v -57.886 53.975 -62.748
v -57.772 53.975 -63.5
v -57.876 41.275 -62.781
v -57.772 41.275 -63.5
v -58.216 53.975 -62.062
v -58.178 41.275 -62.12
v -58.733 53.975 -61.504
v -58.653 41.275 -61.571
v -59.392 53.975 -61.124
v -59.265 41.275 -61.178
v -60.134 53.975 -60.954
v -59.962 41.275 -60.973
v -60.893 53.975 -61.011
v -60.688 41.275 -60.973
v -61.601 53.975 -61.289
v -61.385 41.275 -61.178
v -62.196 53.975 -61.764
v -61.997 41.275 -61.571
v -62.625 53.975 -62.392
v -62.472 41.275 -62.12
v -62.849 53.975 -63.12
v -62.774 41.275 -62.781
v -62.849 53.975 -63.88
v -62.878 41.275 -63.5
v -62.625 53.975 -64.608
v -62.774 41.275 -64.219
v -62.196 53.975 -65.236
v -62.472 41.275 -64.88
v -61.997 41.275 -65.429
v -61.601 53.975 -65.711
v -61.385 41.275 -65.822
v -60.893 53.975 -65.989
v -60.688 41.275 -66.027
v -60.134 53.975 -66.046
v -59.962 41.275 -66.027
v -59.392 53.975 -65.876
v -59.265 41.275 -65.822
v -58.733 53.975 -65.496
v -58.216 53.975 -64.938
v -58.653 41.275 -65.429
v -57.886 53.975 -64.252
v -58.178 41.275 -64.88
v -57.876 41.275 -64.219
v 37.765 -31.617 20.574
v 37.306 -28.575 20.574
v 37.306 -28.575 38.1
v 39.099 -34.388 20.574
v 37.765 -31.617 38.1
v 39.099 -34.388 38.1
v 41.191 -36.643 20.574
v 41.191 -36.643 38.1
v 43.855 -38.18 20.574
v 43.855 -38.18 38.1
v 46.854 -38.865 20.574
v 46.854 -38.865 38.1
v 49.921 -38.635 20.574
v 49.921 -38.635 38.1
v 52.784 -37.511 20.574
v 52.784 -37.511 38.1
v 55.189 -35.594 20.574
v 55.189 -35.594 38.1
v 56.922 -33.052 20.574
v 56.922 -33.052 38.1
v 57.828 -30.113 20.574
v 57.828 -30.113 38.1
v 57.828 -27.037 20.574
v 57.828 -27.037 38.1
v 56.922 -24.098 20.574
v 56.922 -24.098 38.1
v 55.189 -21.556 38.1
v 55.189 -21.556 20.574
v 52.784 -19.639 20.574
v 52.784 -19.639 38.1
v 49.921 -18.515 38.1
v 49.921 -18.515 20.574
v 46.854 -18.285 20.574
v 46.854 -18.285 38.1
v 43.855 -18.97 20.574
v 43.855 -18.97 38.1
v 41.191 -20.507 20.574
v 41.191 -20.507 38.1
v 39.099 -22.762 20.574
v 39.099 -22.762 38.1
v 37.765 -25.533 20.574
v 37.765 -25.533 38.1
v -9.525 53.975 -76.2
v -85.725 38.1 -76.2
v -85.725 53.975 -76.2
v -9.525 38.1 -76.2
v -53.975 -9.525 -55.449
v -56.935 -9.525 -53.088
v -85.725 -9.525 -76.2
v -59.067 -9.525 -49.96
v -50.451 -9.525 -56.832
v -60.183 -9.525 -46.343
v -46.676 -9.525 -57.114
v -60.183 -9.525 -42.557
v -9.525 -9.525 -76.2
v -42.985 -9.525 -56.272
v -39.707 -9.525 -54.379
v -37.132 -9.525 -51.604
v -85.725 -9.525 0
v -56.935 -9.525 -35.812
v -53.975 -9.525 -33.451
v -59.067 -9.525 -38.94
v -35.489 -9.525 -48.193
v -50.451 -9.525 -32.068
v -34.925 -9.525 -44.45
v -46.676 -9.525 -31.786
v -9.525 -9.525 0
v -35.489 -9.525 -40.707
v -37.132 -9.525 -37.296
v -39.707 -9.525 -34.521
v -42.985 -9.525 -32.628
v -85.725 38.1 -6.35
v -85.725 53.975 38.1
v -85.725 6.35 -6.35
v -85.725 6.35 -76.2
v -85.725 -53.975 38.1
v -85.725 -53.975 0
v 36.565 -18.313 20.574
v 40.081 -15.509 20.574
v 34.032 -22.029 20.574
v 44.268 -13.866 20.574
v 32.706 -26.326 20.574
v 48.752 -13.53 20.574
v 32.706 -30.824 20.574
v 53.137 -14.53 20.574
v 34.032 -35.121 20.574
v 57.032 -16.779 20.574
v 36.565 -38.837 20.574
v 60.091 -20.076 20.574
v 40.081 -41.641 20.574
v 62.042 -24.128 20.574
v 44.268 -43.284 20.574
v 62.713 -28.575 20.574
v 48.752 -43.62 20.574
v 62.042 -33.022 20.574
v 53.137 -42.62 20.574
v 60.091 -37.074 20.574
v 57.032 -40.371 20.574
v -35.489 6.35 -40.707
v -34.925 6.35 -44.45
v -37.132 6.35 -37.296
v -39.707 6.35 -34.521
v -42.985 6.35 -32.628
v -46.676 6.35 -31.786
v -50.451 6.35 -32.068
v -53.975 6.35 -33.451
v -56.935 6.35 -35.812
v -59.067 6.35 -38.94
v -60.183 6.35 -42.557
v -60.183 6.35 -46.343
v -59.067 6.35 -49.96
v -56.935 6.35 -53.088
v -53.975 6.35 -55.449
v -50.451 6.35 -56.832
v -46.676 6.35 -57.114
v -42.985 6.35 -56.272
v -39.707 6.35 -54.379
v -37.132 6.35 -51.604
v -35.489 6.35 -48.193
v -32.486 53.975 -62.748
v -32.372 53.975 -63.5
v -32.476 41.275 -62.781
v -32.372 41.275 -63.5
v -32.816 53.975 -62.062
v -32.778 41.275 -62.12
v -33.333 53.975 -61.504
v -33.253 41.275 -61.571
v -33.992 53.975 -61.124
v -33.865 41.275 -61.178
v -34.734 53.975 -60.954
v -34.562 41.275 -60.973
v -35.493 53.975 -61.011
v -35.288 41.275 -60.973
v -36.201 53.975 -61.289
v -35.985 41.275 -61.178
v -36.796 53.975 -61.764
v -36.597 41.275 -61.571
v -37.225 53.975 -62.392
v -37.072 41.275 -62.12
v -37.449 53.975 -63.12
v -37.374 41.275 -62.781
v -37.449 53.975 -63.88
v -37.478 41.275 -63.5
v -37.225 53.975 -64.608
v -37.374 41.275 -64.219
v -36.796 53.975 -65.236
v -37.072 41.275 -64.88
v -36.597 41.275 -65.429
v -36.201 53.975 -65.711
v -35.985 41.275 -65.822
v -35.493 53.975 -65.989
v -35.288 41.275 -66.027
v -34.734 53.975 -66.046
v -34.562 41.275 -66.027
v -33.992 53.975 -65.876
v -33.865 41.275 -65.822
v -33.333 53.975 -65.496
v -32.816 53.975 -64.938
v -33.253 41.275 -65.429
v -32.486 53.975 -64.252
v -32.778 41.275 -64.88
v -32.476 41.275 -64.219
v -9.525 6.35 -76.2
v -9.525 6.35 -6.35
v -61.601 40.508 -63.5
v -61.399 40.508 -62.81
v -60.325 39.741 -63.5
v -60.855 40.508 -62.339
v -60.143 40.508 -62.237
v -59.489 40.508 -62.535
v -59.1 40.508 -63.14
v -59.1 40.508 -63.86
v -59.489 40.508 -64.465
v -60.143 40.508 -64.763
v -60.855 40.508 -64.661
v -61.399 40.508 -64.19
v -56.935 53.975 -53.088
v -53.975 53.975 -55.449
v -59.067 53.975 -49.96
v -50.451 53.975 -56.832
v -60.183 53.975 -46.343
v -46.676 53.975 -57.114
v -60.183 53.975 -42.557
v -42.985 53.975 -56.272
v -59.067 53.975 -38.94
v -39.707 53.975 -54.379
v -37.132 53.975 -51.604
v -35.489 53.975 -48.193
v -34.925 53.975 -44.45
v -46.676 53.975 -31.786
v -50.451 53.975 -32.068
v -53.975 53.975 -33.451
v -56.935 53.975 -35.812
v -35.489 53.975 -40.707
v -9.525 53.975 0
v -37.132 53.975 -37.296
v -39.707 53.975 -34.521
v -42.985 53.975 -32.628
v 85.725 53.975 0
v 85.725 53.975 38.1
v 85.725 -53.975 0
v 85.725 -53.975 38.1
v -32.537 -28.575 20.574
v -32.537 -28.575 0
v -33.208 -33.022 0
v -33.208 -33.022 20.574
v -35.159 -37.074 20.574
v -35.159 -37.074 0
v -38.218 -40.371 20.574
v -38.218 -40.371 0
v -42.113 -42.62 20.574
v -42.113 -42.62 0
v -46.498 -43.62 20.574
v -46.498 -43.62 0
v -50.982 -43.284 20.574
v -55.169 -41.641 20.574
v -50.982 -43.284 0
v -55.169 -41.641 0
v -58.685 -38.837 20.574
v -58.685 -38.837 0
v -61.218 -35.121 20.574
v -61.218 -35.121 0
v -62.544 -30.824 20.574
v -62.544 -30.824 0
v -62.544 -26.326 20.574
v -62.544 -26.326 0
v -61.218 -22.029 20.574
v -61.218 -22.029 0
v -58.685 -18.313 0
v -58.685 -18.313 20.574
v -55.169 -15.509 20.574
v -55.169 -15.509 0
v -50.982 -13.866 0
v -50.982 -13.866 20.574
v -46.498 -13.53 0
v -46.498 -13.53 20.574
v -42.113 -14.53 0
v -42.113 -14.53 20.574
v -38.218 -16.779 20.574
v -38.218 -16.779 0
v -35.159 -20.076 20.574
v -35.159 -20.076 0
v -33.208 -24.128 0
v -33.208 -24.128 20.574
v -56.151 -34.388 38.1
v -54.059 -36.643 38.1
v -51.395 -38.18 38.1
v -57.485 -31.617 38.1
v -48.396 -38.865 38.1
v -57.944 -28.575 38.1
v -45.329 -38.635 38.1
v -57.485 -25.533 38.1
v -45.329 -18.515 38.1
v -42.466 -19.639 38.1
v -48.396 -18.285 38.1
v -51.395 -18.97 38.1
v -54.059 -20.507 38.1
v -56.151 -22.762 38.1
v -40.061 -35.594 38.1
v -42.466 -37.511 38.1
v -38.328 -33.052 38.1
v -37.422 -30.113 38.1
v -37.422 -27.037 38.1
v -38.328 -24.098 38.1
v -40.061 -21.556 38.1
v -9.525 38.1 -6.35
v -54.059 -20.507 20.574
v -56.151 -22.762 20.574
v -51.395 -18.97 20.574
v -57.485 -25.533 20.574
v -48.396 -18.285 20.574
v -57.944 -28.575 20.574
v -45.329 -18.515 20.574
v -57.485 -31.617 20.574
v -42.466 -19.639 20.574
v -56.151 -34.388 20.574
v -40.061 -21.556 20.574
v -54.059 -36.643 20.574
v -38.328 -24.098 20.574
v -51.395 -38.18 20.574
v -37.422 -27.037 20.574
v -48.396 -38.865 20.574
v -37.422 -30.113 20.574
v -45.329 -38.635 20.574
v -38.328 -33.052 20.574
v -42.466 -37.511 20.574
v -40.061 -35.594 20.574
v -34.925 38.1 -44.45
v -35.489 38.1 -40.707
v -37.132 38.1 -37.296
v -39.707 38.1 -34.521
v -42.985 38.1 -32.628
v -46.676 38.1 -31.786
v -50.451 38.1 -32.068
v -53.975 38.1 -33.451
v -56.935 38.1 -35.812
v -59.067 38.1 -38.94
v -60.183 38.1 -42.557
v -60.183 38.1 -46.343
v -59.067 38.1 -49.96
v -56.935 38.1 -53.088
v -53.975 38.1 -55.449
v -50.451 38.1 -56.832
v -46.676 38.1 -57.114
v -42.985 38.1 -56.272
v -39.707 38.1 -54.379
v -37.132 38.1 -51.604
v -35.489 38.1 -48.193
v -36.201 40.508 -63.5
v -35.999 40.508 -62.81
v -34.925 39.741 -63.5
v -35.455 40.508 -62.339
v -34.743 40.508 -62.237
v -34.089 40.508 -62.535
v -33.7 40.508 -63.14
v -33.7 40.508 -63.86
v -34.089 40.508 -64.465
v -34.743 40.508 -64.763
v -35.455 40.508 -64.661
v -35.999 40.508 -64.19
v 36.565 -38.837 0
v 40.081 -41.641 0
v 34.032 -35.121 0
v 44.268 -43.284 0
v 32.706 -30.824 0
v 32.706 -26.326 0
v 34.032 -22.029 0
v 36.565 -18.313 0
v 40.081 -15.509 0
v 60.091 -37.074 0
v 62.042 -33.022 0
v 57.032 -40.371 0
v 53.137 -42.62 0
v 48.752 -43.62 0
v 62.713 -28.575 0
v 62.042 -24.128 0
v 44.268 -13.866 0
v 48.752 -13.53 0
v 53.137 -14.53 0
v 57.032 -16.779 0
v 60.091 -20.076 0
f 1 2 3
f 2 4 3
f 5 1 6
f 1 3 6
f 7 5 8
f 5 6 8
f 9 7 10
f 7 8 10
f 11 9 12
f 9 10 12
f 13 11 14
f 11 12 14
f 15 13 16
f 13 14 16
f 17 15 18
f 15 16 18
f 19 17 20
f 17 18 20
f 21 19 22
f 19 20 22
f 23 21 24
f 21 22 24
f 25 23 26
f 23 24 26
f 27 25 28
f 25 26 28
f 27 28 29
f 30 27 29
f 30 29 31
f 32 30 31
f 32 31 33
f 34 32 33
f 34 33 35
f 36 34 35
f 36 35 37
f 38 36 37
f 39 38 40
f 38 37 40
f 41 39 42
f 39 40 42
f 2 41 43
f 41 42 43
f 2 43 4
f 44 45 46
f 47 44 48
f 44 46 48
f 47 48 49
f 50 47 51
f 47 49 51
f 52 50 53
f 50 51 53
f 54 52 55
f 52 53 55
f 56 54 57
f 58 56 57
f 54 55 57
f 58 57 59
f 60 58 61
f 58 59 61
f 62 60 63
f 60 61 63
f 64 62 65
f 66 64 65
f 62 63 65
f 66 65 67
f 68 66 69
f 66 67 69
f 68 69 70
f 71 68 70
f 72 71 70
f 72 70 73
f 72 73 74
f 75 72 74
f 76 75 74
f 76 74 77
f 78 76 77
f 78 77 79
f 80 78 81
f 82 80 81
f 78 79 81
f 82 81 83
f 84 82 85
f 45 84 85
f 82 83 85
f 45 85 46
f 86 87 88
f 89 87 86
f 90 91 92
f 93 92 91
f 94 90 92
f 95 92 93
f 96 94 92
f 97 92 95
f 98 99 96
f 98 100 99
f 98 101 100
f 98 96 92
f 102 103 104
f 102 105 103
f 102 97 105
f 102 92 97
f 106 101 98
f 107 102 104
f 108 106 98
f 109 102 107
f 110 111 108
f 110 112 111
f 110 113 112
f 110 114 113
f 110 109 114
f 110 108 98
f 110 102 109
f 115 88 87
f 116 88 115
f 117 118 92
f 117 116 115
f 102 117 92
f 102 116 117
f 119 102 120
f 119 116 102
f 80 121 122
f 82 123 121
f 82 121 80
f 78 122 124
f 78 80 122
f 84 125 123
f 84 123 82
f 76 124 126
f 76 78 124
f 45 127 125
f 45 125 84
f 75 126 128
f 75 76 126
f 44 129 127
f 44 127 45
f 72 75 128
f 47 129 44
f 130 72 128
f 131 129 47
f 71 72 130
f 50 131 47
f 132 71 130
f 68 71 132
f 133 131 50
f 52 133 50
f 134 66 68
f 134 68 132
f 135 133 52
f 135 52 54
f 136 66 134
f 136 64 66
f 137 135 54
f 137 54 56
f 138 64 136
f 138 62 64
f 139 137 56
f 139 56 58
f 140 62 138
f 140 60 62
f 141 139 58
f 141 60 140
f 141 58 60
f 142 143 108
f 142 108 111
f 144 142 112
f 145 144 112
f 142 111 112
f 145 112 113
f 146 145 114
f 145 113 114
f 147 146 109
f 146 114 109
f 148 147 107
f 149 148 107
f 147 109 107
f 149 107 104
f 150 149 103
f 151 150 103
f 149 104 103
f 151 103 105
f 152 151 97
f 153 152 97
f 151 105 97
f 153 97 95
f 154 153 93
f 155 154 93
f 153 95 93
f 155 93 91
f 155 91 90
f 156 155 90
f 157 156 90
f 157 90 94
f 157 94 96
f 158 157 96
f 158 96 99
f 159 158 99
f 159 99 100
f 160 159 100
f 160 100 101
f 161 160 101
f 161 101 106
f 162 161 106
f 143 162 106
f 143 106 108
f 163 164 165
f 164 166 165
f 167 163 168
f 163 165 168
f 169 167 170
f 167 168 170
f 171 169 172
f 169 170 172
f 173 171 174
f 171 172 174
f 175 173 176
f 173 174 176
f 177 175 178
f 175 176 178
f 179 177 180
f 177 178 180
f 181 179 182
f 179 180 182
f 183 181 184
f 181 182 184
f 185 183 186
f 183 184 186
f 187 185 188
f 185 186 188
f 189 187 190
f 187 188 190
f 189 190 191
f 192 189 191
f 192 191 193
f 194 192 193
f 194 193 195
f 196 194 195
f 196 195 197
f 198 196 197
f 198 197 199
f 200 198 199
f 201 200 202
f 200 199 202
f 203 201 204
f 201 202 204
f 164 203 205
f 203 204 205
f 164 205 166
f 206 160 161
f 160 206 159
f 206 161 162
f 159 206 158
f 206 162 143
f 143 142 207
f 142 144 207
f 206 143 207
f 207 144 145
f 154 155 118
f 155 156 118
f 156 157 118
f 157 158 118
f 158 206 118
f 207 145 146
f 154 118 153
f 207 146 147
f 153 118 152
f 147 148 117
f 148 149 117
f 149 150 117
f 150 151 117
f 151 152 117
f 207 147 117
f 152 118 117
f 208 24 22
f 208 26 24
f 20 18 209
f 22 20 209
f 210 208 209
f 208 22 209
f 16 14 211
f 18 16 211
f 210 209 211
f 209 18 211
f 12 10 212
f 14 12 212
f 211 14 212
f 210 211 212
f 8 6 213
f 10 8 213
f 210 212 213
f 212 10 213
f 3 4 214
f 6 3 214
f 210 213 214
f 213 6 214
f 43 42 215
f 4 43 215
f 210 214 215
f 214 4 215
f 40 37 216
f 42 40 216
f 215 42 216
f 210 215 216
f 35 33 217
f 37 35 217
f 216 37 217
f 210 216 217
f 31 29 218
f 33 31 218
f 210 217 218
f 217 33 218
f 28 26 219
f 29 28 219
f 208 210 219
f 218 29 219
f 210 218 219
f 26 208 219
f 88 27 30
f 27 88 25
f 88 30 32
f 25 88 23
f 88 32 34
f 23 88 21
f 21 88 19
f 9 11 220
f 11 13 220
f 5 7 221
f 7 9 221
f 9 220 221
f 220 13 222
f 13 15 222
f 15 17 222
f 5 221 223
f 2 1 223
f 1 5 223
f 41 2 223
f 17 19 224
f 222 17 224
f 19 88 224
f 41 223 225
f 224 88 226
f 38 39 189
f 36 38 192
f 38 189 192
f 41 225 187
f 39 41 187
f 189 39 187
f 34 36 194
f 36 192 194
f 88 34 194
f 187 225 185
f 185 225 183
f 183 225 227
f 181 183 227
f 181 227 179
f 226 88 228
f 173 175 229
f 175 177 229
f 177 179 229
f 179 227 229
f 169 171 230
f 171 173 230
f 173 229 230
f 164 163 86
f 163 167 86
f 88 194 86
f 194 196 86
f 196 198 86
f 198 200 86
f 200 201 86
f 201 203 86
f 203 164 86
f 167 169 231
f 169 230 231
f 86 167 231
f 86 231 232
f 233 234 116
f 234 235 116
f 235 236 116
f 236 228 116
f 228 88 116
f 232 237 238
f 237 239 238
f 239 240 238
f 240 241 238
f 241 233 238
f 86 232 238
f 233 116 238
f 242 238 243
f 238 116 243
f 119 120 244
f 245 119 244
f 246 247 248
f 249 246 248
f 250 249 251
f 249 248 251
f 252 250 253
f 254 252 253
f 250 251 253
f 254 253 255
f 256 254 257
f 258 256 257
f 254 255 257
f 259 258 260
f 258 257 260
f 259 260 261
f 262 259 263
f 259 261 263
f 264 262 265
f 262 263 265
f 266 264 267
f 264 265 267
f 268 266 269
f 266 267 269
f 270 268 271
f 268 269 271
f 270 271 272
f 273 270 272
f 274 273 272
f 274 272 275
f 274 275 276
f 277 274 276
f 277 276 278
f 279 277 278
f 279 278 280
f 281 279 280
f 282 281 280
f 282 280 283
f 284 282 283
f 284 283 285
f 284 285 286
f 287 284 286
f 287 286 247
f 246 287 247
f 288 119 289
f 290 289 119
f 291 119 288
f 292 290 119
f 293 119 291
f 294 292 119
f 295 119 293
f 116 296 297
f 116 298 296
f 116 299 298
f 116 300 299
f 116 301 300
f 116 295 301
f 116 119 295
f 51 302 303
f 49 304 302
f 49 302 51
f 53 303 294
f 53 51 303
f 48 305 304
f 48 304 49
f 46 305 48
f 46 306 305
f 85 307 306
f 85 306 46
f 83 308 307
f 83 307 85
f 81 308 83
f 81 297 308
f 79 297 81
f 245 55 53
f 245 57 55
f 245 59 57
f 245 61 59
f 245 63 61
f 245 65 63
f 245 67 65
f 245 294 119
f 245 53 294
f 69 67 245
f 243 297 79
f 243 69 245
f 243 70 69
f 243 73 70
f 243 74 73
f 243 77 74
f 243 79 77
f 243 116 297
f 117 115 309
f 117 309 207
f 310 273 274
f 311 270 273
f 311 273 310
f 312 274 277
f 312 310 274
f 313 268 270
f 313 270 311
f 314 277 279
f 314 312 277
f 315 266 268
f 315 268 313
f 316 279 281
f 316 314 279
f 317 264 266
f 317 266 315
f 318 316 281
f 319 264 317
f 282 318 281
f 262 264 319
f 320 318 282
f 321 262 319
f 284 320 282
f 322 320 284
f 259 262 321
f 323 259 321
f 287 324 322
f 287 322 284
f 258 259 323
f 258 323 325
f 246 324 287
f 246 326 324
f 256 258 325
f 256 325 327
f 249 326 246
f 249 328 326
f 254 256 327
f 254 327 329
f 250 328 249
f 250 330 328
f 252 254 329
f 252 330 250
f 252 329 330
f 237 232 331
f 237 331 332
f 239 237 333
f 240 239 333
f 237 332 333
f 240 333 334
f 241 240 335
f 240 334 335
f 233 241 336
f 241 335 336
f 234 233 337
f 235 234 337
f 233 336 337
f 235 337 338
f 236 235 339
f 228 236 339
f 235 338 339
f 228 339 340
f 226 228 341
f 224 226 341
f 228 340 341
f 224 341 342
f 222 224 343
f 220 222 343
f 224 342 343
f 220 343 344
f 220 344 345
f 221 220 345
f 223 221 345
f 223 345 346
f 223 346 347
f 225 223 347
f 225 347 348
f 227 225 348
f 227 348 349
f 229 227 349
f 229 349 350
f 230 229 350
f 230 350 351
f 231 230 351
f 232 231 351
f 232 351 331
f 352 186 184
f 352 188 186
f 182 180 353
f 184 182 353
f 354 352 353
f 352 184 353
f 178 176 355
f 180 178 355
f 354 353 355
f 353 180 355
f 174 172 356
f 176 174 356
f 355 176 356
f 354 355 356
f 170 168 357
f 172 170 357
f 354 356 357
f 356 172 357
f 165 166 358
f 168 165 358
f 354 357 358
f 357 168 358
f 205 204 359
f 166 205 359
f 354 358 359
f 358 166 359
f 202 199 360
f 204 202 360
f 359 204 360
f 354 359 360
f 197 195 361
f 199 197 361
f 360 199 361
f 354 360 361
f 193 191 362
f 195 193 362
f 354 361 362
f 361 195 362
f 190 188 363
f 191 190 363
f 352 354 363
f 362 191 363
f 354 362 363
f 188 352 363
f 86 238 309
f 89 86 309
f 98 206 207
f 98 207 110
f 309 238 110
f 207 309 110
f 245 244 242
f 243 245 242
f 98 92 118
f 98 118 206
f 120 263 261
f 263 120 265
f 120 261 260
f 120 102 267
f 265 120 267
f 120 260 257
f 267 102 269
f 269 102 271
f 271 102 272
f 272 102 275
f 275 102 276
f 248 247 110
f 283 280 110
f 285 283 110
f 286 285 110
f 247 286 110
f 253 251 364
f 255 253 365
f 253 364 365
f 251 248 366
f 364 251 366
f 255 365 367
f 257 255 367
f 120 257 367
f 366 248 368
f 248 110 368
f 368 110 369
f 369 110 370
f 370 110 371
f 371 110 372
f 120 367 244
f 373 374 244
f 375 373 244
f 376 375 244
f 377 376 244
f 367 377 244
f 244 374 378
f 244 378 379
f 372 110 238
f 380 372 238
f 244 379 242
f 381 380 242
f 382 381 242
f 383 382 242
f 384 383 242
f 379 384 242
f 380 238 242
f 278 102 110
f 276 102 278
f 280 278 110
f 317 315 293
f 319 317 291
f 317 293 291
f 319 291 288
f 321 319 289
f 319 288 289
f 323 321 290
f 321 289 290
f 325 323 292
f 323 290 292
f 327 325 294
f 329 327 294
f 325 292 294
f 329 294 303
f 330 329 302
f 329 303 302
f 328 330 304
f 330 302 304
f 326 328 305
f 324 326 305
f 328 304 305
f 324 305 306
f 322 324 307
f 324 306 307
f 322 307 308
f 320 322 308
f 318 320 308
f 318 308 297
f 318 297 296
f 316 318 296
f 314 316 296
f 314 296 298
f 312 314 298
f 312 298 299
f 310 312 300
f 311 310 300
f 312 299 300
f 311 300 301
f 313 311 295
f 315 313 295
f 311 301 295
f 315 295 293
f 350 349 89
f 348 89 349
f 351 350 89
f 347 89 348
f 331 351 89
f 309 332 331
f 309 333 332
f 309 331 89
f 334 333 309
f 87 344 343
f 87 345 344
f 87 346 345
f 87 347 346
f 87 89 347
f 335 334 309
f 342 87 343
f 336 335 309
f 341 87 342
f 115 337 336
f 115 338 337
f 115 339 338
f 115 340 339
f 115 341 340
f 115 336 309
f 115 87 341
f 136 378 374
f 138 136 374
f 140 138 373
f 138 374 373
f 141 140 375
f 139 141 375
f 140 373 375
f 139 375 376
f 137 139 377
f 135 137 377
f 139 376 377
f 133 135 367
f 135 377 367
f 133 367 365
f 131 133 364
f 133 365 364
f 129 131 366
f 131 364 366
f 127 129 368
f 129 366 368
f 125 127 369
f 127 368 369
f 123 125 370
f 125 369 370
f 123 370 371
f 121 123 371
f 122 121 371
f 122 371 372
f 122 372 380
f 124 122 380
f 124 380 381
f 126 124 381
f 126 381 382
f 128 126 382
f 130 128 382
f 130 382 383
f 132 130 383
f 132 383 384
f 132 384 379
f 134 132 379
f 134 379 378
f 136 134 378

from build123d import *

# Parameters (mm, degrees)
F0_W           = 171.45
F0_H           = 107.95
F1_DEPTH       = 38.1
F3_D           = 20.6375
F3_CBORE_D     = 30.1752
F3_CBORE_DEPTH = 20.574
F2_W           = 76.2
F2_H           = 63.5
F4_DEPTH       = 76.2
F5_W           = 31.75
F5_H           = 139.7
F6_DEPTH       = 171.451
F8_D           = 25.4
F10_D          = 5.1054
F10_DEPTH      = 12.7
F10_TIP        = 1.5338169022


with BuildPart() as f1:
    # F0 (on Top) → F1 (new body)
    with BuildSketch(Plane.XY):
        Rectangle(F0_W, F0_H)
    extrude(amount=F1_DEPTH)

    # F3 (through all)
    with Locations(Plane(origin=(0, 0, 0), x_dir=(1, 0, 0), z_dir=(0, 0, -1))):
        with Locations((-47.625, 28.575), (47.625, 28.575)):
            CounterBoreHole(F3_D / 2, F3_CBORE_D / 2, F3_CBORE_DEPTH)

    # F2 (on face) → F4 (join)
    with BuildSketch(Plane(origin=(0, 0, 0), x_dir=(1, 0, 0), z_dir=(0, 0, -1))):
        with Locations((-47.625, -22.225)):
            Rectangle(F2_W, F2_H)
    extrude(amount=F4_DEPTH)

    # F5 (on face) → F6 (cut, through all)
    with BuildSketch(Plane(origin=(-85.725, 0, 0), x_dir=(0, -1, 0), z_dir=(-1, 0, 0))):
        with Locations((-22.225, -76.2)):
            Rectangle(F5_W, F5_H)
    extrude(amount=-F6_DEPTH, mode=Mode.SUBTRACT)

    # F8 (through all)
    with Locations(Plane(origin=(0, 53.975, 0), x_dir=(-1, 0, 0), z_dir=(0, 1, 0))):
        with Locations((47.625, -44.45)):
            Hole(F8_D / 2)

    # F10
    with Locations(Plane(origin=(0, 53.975, 0), x_dir=(-1, 0, 0), z_dir=(0, 1, 0))):
        with Locations((34.925, -63.5), (60.325, -63.5)):
            Hole(F10_D / 2, depth=F10_DEPTH)
            with Locations((0, 0, -(F10_DEPTH + F10_TIP / 2))):  # 118° drill point
                Cone(0, F10_D / 2, F10_TIP, mode=Mode.SUBTRACT)


solid = f1.part
